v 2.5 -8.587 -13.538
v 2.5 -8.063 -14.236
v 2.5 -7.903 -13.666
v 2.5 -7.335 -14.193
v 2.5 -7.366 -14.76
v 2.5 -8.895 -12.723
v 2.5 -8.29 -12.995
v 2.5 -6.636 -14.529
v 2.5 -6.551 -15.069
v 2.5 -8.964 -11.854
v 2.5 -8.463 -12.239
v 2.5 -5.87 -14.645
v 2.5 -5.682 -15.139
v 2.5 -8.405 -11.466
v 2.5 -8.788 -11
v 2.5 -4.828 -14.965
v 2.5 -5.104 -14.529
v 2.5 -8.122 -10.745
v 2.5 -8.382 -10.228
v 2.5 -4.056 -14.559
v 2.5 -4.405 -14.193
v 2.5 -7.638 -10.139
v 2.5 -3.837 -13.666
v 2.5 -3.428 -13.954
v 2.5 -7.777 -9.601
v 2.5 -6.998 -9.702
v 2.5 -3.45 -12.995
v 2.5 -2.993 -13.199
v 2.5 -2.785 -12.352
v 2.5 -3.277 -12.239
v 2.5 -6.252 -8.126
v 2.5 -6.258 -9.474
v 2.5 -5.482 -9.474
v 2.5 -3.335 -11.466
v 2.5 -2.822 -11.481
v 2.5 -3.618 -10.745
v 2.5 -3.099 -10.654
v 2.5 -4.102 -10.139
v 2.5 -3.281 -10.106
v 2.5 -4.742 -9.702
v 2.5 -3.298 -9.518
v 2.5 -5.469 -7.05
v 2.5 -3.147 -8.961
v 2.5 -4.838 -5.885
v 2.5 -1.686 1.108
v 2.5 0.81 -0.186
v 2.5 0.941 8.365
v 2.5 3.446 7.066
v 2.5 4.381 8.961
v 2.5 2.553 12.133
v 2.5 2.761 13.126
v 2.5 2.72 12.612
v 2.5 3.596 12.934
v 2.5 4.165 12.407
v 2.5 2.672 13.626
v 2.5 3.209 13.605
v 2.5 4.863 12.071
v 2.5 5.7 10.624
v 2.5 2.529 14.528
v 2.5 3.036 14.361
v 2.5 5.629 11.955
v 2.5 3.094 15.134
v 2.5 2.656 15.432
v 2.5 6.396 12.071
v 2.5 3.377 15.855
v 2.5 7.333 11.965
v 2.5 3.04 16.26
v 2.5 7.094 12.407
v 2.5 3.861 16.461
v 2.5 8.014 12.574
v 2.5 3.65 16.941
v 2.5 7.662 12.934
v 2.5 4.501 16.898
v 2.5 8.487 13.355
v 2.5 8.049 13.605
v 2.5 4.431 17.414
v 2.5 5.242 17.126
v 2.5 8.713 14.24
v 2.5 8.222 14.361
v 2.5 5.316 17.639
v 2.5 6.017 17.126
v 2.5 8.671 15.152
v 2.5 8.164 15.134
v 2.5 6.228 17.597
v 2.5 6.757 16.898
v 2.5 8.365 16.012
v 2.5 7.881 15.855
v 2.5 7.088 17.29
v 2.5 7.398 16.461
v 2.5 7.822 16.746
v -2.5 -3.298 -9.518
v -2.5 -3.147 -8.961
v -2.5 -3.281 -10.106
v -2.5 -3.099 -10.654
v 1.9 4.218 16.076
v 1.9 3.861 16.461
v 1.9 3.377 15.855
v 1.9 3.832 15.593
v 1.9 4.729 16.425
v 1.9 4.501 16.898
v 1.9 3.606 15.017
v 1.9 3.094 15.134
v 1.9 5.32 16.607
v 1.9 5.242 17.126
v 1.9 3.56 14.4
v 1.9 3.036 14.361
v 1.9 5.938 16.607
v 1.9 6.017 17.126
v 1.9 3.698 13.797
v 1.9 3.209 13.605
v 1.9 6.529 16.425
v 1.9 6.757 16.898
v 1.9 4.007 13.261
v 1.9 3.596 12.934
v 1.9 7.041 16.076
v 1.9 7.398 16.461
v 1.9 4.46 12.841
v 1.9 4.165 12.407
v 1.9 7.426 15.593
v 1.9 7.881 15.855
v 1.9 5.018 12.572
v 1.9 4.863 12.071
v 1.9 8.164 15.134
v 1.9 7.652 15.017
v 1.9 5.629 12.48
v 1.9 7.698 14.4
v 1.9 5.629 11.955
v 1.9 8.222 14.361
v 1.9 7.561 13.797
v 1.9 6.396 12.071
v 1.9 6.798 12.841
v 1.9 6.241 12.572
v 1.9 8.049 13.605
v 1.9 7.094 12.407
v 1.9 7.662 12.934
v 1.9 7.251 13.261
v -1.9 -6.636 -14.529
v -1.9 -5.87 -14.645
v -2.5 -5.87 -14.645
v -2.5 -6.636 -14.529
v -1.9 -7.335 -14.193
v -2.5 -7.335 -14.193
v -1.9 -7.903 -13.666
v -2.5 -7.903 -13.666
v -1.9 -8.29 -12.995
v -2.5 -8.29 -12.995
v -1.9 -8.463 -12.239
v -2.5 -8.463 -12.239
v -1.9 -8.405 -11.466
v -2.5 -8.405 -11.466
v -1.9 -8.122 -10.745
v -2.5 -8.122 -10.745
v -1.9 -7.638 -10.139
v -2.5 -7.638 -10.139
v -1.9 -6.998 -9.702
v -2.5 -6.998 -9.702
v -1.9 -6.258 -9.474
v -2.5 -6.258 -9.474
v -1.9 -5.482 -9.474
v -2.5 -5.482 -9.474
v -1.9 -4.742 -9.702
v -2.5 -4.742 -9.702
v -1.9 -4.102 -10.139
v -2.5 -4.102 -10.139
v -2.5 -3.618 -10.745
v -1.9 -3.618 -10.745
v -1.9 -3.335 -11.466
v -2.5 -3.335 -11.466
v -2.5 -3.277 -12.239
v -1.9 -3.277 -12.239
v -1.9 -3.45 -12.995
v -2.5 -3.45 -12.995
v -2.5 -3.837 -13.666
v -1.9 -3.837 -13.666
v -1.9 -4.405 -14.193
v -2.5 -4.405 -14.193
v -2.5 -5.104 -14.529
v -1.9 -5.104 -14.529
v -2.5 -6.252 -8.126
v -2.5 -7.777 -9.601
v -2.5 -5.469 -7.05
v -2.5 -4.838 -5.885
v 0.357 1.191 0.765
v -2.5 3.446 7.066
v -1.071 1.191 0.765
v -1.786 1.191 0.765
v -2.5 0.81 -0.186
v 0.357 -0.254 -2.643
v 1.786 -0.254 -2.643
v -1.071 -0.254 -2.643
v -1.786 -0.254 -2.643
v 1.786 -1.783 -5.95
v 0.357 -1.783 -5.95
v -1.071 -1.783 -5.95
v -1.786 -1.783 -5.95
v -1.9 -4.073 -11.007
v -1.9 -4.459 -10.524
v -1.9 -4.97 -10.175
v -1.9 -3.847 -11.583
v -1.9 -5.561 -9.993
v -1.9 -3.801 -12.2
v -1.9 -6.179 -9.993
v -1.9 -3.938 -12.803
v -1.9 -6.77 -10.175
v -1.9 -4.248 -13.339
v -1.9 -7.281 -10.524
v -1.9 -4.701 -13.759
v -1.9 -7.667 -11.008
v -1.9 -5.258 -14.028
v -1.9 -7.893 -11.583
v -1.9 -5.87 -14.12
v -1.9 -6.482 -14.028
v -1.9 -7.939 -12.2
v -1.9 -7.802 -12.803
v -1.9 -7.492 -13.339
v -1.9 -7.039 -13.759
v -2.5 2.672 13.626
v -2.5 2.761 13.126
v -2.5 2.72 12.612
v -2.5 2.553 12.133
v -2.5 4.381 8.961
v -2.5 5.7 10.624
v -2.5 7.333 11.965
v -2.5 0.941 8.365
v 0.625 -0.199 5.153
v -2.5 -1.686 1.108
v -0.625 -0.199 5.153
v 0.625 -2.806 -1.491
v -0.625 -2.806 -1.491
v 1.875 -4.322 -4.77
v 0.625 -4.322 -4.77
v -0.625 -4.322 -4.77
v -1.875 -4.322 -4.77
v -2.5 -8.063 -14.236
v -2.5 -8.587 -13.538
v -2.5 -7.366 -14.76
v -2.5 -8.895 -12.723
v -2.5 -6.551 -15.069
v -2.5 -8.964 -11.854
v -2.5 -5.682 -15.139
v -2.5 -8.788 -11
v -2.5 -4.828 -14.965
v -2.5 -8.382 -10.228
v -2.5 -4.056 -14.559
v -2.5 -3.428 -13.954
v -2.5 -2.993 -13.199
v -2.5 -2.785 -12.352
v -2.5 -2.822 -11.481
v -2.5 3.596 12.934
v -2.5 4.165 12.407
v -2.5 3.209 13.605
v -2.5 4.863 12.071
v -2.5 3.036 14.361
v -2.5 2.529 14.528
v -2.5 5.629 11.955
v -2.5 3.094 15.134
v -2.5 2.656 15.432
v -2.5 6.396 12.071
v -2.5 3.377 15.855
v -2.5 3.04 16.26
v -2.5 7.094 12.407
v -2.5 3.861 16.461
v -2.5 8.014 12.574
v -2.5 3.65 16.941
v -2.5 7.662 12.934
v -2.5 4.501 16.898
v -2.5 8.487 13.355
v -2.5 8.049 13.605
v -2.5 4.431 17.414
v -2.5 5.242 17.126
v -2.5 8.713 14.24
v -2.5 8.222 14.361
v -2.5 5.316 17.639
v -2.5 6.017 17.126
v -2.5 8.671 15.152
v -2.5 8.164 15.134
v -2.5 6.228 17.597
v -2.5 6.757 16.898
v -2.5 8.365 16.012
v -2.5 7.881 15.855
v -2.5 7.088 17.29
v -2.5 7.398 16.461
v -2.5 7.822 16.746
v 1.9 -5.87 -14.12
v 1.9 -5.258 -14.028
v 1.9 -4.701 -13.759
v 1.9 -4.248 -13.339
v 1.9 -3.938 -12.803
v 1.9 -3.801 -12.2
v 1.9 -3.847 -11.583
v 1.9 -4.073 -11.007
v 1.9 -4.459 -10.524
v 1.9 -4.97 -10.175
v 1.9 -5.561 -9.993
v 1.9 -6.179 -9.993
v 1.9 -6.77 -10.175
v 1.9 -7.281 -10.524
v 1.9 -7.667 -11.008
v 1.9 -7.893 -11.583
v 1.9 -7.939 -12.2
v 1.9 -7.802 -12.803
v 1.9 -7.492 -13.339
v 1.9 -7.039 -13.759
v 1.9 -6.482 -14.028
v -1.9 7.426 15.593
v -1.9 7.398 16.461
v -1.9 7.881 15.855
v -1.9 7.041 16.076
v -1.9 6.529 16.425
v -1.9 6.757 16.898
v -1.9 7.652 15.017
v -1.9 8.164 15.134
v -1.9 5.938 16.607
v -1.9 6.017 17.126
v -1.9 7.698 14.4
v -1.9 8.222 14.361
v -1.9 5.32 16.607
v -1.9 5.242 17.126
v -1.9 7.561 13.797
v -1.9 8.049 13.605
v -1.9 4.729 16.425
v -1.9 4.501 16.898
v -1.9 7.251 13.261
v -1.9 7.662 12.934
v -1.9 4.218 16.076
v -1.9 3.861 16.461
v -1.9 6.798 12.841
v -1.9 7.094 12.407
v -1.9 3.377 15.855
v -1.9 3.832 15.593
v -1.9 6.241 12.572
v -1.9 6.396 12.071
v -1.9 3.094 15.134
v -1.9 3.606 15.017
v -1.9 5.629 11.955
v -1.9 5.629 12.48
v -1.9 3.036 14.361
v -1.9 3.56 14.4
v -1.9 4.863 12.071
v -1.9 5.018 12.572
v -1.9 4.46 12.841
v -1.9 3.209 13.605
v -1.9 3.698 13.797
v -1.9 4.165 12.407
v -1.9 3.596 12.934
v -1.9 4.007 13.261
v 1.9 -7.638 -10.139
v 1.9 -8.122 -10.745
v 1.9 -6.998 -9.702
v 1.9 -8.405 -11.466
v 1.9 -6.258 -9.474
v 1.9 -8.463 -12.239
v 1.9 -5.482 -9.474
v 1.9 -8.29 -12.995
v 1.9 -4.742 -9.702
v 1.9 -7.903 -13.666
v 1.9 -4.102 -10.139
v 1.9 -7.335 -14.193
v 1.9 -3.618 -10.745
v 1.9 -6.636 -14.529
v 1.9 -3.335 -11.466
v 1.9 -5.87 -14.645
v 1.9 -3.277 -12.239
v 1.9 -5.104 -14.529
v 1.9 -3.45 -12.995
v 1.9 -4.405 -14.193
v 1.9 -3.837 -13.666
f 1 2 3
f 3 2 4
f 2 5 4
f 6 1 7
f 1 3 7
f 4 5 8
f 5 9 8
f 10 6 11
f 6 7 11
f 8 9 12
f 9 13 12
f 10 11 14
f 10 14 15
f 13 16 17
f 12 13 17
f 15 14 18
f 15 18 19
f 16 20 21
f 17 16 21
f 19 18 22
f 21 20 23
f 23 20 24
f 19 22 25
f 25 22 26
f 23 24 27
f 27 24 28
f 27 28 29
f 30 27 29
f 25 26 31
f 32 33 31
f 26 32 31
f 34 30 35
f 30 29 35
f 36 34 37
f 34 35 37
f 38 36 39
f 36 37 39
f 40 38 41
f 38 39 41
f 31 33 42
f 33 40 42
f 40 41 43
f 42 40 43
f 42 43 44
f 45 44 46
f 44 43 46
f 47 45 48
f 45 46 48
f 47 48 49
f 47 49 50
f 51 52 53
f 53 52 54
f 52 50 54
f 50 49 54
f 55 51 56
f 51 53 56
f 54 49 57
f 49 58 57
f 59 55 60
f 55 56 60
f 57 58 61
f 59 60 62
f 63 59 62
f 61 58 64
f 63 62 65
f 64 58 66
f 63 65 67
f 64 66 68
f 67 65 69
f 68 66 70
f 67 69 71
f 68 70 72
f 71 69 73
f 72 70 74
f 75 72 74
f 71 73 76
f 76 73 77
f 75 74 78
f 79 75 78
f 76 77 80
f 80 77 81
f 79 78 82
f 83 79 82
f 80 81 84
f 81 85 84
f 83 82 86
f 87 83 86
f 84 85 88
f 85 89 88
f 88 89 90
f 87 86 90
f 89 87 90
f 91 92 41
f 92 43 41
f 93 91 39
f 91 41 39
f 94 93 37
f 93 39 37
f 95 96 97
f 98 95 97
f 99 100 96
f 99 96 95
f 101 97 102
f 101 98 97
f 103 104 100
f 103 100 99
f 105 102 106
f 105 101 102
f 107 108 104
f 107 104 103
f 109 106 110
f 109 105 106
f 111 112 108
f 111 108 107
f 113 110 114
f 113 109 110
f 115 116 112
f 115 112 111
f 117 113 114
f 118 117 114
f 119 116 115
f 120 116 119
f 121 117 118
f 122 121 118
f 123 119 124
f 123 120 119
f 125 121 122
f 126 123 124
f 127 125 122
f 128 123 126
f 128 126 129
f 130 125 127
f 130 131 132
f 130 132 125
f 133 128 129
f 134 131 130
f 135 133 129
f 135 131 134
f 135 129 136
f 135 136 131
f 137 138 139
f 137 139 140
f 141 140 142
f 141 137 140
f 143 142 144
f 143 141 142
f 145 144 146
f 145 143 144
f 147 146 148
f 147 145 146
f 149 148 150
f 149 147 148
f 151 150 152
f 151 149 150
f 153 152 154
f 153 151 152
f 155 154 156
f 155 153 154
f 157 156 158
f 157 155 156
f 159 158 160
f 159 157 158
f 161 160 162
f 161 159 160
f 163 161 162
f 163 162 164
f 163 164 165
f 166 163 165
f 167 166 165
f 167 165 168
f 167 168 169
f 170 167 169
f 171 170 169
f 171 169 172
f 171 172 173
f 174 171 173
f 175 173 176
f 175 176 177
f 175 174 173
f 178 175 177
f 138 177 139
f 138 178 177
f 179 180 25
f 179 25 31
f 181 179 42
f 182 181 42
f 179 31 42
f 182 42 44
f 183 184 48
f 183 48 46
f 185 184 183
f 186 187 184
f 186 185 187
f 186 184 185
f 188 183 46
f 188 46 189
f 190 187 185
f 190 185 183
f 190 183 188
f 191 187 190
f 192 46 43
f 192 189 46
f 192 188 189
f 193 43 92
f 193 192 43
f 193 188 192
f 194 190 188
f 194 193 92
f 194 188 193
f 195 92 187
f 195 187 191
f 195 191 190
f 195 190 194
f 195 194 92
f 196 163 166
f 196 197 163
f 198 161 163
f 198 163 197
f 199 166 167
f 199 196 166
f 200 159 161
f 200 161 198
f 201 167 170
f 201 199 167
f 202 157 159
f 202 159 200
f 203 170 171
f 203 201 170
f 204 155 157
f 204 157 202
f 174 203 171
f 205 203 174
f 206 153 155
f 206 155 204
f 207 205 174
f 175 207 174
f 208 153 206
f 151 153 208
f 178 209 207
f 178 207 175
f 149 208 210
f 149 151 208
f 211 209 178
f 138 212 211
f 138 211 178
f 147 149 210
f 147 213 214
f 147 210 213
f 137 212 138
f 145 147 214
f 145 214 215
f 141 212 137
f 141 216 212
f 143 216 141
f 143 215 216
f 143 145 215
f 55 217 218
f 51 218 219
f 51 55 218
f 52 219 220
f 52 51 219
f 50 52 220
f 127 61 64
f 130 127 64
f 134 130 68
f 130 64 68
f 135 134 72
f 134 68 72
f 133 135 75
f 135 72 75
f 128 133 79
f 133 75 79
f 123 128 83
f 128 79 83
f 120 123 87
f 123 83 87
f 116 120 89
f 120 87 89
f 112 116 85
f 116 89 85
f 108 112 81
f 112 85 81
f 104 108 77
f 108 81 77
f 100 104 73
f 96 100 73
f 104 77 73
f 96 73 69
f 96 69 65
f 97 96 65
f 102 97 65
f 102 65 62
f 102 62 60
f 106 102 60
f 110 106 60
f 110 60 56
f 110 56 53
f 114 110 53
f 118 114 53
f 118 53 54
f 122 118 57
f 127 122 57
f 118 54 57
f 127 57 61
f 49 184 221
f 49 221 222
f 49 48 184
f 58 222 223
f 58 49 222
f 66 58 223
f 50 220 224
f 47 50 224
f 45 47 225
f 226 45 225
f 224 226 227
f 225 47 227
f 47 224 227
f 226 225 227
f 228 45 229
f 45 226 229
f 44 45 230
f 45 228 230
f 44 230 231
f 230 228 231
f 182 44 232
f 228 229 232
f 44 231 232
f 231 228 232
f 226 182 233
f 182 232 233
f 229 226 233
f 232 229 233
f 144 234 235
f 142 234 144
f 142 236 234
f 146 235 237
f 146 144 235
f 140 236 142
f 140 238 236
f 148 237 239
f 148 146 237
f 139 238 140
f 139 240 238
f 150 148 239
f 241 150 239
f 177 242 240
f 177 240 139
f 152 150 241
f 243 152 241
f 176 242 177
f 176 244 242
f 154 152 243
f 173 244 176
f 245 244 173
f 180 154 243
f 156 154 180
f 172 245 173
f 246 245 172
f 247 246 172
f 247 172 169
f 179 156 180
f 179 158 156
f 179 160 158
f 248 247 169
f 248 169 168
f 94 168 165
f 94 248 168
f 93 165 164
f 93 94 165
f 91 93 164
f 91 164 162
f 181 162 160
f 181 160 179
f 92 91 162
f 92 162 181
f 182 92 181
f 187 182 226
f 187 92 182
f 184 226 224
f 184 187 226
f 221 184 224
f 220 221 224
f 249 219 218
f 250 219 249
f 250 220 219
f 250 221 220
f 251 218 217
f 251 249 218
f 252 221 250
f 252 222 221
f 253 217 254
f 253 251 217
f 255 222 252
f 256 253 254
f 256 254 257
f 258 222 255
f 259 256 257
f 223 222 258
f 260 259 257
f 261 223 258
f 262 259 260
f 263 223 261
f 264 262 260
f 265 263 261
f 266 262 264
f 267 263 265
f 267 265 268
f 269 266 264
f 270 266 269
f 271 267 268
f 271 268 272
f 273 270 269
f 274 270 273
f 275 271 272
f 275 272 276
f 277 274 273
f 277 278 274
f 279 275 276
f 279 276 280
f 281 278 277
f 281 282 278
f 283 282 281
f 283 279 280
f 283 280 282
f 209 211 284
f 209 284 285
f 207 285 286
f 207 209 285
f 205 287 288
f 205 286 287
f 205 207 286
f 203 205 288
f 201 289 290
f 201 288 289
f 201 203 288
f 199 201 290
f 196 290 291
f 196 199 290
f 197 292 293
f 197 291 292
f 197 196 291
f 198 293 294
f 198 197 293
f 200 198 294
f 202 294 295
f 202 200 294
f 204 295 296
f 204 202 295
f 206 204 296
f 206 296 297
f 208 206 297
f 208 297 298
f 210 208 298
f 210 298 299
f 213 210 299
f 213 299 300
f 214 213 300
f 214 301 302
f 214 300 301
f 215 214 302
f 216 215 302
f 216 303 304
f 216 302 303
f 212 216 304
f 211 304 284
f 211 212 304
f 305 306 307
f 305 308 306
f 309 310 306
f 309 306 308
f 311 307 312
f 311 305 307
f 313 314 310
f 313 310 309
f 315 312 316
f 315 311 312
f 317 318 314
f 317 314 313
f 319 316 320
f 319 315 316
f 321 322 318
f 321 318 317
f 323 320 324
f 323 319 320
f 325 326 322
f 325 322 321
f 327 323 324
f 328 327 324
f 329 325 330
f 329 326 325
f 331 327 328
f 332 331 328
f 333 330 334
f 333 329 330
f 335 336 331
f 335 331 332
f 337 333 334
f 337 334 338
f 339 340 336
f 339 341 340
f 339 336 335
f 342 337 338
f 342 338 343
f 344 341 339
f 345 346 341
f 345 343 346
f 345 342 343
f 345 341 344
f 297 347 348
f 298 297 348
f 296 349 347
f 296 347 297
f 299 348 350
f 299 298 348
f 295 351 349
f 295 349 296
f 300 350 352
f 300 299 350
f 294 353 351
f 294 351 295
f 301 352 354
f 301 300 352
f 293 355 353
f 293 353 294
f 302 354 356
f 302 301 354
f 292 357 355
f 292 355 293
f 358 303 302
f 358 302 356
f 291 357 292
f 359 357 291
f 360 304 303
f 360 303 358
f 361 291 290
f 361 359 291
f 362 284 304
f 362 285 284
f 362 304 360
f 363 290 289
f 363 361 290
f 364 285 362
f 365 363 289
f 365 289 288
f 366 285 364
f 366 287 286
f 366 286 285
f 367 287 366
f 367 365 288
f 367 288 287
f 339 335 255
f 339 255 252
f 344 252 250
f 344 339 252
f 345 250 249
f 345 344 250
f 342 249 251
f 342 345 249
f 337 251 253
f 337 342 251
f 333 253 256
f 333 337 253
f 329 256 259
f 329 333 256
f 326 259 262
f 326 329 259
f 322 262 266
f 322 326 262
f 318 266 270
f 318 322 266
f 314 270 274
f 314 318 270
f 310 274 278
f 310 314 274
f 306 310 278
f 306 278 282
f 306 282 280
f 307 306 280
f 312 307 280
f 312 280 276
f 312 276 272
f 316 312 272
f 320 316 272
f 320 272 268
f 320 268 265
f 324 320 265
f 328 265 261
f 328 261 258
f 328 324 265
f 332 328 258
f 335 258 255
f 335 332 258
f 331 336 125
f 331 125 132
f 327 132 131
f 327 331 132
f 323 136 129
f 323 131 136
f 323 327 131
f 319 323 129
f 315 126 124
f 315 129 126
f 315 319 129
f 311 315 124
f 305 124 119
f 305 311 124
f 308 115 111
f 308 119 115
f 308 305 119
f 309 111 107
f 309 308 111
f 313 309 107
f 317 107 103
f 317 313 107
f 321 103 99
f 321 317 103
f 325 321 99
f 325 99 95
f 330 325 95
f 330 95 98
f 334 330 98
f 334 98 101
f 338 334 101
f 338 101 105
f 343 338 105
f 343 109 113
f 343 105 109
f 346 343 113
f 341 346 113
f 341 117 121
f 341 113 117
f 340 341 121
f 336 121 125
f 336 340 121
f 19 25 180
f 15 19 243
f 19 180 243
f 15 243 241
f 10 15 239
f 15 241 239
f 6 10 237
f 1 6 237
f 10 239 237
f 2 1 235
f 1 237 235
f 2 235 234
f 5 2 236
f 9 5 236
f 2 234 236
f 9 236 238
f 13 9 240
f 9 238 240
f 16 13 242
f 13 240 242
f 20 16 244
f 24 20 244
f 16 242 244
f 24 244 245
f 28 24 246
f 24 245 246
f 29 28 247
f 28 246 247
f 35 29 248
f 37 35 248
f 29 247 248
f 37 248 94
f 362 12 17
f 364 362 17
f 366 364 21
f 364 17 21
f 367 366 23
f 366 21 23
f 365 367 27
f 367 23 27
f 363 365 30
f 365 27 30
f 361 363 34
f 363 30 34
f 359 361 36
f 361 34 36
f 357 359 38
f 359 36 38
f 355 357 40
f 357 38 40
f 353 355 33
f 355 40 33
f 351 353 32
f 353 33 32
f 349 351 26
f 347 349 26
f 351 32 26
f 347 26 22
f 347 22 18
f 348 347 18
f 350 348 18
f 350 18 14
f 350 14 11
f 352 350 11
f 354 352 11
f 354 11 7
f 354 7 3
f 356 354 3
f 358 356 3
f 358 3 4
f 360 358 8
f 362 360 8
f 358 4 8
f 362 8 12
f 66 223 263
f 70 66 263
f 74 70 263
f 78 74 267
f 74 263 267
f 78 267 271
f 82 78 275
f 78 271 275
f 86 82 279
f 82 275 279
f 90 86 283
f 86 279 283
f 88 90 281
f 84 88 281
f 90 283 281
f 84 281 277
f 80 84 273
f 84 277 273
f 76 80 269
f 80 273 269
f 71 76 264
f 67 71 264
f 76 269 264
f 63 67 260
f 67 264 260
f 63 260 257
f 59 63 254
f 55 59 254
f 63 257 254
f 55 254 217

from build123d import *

# Parameters (mm, degrees)
BOSS_EXTRUDE1_START     = -2.5
BOSS_EXTRUDE1_OUTLINE_R = 2.075
BOSS_EXTRUDE1_DEPTH     = 5
FILLET1_R               = 10
FILLET2_R               = 2
SKETCH6_R               = 2.6
CUT_EXTRUDE3_DEPTH      = 0.6
CUT_EXTRUDE4_START      = -0.6
SKETCH7_R               = 2.6
CUT_EXTRUDE4_DEPTH      = 0.6


# Read off the part's stored shape, not the designer's step: Boss-Extrude1
with BuildPart() as part:
    # Boss-Extrude1 outline → Boss-Extrude1 (new body)
    with BuildSketch(Plane(origin=(0, 0, 0), x_dir=(0, 0, -1), z_dir=(1, 0, 0)).offset(BOSS_EXTRUDE1_START)):
        with BuildLine():
            add(Edge.make_bspline(
                [(-11.466730601, 5.359735873), (-11.25264516, 5.245467231), (-10.023154699, 4.613615297), (-6.586726751, 3.178813175), (-1.892828151, 1.72609315), (2.664342093, -0.241853498), (5.954936132, -1.791511585), (8.378645161, -2.904482128), (9.714889181, -3.469566052), (9.963523485, -3.57272868)],
                knots=[0.098312483, 0.098312483, 0.098312483, 0.098312483, 0.125, 0.25, 0.5, 0.625, 0.75, 0.875, 0.903535222, 0.903535222, 0.903535222, 0.903535222], degree=3))
            ThreePointArc((-11.466730601, 5.359735873), (-17.18709042, 7.266876949), (-12.948862581, 2.977689575))
            add(Edge.make_bspline(
                [(-12.948862581, 2.977689575), (-12.654908429, 2.818079718), (-11.233080684, 2.082292793), (-8.617564406, 0.994573419), (-5.134340834, -0.202666732), (-1.7606679, -1.38003851), (1.486902599, -2.78360156), (4.761104026, -4.323813239), (7.2522862, -5.469616162), (8.677110193, -6.070847079), (8.961386544, -6.18832068)],
                knots=[0.09219974, 0.09219974, 0.09219974, 0.09219974, 0.125, 0.25, 0.375, 0.5, 0.625, 0.75, 0.875, 0.905961816, 0.905961816, 0.905961816, 0.905961816], degree=3))
            ThreePointArc((8.961386544, -6.18832068), (14.939800335, -6.979112718), (9.963523485, -3.57272868))
        make_face()
        with Locations((12.045, -5.87)):
            Circle(BOSS_EXTRUDE1_OUTLINE_R, mode=Mode.SUBTRACT)
        with Locations((-14.555, 5.629165125)):
            Circle(BOSS_EXTRUDE1_OUTLINE_R, mode=Mode.SUBTRACT)
    extrude(amount=BOSS_EXTRUDE1_DEPTH)

    # Fillet1
    fillet1_edges = [part.edges().sort_by_distance(p)[0] for p in [
        (0, -6.18832068, -8.961386544),
        (0, 5.359735873, 11.466730601),
    ]]
    fillet(fillet1_edges, radius=FILLET1_R)

    # Fillet2
    fillet2_edges = [part.edges().sort_by_distance(p)[0] for p in [
        (0, -3.57272868, -9.963523485),
        (0, 2.977689575, 12.948862581),
    ]]
    fillet(fillet2_edges, radius=FILLET2_R)

    # Sketch6 → Cut-Extrude3 (cut)
    with BuildSketch(Plane(origin=(2.5, 0, 0), x_dir=(0, 0, -1), z_dir=(1, 0, 0))):
        with Locations((-14.555, 5.629165125)):
            Circle(SKETCH6_R)
        with Locations((12.045, -5.87)):
            Circle(SKETCH6_R)
    extrude(amount=-CUT_EXTRUDE3_DEPTH, mode=Mode.SUBTRACT)

    # Sketch7 → Cut-Extrude4 (cut)
    with BuildSketch(Plane.ZY.offset(2.5).offset(CUT_EXTRUDE4_START)):
        with Locations(Location((14.555, 5.629165125, 0), (0, 0, 180))):
            Circle(SKETCH7_R)
        with Locations(Location((-12.045, -5.87, 0), (0, 0, 180))):
            Circle(SKETCH7_R)
    extrude(amount=CUT_EXTRUDE4_DEPTH, mode=Mode.SUBTRACT)


solid = part.part
